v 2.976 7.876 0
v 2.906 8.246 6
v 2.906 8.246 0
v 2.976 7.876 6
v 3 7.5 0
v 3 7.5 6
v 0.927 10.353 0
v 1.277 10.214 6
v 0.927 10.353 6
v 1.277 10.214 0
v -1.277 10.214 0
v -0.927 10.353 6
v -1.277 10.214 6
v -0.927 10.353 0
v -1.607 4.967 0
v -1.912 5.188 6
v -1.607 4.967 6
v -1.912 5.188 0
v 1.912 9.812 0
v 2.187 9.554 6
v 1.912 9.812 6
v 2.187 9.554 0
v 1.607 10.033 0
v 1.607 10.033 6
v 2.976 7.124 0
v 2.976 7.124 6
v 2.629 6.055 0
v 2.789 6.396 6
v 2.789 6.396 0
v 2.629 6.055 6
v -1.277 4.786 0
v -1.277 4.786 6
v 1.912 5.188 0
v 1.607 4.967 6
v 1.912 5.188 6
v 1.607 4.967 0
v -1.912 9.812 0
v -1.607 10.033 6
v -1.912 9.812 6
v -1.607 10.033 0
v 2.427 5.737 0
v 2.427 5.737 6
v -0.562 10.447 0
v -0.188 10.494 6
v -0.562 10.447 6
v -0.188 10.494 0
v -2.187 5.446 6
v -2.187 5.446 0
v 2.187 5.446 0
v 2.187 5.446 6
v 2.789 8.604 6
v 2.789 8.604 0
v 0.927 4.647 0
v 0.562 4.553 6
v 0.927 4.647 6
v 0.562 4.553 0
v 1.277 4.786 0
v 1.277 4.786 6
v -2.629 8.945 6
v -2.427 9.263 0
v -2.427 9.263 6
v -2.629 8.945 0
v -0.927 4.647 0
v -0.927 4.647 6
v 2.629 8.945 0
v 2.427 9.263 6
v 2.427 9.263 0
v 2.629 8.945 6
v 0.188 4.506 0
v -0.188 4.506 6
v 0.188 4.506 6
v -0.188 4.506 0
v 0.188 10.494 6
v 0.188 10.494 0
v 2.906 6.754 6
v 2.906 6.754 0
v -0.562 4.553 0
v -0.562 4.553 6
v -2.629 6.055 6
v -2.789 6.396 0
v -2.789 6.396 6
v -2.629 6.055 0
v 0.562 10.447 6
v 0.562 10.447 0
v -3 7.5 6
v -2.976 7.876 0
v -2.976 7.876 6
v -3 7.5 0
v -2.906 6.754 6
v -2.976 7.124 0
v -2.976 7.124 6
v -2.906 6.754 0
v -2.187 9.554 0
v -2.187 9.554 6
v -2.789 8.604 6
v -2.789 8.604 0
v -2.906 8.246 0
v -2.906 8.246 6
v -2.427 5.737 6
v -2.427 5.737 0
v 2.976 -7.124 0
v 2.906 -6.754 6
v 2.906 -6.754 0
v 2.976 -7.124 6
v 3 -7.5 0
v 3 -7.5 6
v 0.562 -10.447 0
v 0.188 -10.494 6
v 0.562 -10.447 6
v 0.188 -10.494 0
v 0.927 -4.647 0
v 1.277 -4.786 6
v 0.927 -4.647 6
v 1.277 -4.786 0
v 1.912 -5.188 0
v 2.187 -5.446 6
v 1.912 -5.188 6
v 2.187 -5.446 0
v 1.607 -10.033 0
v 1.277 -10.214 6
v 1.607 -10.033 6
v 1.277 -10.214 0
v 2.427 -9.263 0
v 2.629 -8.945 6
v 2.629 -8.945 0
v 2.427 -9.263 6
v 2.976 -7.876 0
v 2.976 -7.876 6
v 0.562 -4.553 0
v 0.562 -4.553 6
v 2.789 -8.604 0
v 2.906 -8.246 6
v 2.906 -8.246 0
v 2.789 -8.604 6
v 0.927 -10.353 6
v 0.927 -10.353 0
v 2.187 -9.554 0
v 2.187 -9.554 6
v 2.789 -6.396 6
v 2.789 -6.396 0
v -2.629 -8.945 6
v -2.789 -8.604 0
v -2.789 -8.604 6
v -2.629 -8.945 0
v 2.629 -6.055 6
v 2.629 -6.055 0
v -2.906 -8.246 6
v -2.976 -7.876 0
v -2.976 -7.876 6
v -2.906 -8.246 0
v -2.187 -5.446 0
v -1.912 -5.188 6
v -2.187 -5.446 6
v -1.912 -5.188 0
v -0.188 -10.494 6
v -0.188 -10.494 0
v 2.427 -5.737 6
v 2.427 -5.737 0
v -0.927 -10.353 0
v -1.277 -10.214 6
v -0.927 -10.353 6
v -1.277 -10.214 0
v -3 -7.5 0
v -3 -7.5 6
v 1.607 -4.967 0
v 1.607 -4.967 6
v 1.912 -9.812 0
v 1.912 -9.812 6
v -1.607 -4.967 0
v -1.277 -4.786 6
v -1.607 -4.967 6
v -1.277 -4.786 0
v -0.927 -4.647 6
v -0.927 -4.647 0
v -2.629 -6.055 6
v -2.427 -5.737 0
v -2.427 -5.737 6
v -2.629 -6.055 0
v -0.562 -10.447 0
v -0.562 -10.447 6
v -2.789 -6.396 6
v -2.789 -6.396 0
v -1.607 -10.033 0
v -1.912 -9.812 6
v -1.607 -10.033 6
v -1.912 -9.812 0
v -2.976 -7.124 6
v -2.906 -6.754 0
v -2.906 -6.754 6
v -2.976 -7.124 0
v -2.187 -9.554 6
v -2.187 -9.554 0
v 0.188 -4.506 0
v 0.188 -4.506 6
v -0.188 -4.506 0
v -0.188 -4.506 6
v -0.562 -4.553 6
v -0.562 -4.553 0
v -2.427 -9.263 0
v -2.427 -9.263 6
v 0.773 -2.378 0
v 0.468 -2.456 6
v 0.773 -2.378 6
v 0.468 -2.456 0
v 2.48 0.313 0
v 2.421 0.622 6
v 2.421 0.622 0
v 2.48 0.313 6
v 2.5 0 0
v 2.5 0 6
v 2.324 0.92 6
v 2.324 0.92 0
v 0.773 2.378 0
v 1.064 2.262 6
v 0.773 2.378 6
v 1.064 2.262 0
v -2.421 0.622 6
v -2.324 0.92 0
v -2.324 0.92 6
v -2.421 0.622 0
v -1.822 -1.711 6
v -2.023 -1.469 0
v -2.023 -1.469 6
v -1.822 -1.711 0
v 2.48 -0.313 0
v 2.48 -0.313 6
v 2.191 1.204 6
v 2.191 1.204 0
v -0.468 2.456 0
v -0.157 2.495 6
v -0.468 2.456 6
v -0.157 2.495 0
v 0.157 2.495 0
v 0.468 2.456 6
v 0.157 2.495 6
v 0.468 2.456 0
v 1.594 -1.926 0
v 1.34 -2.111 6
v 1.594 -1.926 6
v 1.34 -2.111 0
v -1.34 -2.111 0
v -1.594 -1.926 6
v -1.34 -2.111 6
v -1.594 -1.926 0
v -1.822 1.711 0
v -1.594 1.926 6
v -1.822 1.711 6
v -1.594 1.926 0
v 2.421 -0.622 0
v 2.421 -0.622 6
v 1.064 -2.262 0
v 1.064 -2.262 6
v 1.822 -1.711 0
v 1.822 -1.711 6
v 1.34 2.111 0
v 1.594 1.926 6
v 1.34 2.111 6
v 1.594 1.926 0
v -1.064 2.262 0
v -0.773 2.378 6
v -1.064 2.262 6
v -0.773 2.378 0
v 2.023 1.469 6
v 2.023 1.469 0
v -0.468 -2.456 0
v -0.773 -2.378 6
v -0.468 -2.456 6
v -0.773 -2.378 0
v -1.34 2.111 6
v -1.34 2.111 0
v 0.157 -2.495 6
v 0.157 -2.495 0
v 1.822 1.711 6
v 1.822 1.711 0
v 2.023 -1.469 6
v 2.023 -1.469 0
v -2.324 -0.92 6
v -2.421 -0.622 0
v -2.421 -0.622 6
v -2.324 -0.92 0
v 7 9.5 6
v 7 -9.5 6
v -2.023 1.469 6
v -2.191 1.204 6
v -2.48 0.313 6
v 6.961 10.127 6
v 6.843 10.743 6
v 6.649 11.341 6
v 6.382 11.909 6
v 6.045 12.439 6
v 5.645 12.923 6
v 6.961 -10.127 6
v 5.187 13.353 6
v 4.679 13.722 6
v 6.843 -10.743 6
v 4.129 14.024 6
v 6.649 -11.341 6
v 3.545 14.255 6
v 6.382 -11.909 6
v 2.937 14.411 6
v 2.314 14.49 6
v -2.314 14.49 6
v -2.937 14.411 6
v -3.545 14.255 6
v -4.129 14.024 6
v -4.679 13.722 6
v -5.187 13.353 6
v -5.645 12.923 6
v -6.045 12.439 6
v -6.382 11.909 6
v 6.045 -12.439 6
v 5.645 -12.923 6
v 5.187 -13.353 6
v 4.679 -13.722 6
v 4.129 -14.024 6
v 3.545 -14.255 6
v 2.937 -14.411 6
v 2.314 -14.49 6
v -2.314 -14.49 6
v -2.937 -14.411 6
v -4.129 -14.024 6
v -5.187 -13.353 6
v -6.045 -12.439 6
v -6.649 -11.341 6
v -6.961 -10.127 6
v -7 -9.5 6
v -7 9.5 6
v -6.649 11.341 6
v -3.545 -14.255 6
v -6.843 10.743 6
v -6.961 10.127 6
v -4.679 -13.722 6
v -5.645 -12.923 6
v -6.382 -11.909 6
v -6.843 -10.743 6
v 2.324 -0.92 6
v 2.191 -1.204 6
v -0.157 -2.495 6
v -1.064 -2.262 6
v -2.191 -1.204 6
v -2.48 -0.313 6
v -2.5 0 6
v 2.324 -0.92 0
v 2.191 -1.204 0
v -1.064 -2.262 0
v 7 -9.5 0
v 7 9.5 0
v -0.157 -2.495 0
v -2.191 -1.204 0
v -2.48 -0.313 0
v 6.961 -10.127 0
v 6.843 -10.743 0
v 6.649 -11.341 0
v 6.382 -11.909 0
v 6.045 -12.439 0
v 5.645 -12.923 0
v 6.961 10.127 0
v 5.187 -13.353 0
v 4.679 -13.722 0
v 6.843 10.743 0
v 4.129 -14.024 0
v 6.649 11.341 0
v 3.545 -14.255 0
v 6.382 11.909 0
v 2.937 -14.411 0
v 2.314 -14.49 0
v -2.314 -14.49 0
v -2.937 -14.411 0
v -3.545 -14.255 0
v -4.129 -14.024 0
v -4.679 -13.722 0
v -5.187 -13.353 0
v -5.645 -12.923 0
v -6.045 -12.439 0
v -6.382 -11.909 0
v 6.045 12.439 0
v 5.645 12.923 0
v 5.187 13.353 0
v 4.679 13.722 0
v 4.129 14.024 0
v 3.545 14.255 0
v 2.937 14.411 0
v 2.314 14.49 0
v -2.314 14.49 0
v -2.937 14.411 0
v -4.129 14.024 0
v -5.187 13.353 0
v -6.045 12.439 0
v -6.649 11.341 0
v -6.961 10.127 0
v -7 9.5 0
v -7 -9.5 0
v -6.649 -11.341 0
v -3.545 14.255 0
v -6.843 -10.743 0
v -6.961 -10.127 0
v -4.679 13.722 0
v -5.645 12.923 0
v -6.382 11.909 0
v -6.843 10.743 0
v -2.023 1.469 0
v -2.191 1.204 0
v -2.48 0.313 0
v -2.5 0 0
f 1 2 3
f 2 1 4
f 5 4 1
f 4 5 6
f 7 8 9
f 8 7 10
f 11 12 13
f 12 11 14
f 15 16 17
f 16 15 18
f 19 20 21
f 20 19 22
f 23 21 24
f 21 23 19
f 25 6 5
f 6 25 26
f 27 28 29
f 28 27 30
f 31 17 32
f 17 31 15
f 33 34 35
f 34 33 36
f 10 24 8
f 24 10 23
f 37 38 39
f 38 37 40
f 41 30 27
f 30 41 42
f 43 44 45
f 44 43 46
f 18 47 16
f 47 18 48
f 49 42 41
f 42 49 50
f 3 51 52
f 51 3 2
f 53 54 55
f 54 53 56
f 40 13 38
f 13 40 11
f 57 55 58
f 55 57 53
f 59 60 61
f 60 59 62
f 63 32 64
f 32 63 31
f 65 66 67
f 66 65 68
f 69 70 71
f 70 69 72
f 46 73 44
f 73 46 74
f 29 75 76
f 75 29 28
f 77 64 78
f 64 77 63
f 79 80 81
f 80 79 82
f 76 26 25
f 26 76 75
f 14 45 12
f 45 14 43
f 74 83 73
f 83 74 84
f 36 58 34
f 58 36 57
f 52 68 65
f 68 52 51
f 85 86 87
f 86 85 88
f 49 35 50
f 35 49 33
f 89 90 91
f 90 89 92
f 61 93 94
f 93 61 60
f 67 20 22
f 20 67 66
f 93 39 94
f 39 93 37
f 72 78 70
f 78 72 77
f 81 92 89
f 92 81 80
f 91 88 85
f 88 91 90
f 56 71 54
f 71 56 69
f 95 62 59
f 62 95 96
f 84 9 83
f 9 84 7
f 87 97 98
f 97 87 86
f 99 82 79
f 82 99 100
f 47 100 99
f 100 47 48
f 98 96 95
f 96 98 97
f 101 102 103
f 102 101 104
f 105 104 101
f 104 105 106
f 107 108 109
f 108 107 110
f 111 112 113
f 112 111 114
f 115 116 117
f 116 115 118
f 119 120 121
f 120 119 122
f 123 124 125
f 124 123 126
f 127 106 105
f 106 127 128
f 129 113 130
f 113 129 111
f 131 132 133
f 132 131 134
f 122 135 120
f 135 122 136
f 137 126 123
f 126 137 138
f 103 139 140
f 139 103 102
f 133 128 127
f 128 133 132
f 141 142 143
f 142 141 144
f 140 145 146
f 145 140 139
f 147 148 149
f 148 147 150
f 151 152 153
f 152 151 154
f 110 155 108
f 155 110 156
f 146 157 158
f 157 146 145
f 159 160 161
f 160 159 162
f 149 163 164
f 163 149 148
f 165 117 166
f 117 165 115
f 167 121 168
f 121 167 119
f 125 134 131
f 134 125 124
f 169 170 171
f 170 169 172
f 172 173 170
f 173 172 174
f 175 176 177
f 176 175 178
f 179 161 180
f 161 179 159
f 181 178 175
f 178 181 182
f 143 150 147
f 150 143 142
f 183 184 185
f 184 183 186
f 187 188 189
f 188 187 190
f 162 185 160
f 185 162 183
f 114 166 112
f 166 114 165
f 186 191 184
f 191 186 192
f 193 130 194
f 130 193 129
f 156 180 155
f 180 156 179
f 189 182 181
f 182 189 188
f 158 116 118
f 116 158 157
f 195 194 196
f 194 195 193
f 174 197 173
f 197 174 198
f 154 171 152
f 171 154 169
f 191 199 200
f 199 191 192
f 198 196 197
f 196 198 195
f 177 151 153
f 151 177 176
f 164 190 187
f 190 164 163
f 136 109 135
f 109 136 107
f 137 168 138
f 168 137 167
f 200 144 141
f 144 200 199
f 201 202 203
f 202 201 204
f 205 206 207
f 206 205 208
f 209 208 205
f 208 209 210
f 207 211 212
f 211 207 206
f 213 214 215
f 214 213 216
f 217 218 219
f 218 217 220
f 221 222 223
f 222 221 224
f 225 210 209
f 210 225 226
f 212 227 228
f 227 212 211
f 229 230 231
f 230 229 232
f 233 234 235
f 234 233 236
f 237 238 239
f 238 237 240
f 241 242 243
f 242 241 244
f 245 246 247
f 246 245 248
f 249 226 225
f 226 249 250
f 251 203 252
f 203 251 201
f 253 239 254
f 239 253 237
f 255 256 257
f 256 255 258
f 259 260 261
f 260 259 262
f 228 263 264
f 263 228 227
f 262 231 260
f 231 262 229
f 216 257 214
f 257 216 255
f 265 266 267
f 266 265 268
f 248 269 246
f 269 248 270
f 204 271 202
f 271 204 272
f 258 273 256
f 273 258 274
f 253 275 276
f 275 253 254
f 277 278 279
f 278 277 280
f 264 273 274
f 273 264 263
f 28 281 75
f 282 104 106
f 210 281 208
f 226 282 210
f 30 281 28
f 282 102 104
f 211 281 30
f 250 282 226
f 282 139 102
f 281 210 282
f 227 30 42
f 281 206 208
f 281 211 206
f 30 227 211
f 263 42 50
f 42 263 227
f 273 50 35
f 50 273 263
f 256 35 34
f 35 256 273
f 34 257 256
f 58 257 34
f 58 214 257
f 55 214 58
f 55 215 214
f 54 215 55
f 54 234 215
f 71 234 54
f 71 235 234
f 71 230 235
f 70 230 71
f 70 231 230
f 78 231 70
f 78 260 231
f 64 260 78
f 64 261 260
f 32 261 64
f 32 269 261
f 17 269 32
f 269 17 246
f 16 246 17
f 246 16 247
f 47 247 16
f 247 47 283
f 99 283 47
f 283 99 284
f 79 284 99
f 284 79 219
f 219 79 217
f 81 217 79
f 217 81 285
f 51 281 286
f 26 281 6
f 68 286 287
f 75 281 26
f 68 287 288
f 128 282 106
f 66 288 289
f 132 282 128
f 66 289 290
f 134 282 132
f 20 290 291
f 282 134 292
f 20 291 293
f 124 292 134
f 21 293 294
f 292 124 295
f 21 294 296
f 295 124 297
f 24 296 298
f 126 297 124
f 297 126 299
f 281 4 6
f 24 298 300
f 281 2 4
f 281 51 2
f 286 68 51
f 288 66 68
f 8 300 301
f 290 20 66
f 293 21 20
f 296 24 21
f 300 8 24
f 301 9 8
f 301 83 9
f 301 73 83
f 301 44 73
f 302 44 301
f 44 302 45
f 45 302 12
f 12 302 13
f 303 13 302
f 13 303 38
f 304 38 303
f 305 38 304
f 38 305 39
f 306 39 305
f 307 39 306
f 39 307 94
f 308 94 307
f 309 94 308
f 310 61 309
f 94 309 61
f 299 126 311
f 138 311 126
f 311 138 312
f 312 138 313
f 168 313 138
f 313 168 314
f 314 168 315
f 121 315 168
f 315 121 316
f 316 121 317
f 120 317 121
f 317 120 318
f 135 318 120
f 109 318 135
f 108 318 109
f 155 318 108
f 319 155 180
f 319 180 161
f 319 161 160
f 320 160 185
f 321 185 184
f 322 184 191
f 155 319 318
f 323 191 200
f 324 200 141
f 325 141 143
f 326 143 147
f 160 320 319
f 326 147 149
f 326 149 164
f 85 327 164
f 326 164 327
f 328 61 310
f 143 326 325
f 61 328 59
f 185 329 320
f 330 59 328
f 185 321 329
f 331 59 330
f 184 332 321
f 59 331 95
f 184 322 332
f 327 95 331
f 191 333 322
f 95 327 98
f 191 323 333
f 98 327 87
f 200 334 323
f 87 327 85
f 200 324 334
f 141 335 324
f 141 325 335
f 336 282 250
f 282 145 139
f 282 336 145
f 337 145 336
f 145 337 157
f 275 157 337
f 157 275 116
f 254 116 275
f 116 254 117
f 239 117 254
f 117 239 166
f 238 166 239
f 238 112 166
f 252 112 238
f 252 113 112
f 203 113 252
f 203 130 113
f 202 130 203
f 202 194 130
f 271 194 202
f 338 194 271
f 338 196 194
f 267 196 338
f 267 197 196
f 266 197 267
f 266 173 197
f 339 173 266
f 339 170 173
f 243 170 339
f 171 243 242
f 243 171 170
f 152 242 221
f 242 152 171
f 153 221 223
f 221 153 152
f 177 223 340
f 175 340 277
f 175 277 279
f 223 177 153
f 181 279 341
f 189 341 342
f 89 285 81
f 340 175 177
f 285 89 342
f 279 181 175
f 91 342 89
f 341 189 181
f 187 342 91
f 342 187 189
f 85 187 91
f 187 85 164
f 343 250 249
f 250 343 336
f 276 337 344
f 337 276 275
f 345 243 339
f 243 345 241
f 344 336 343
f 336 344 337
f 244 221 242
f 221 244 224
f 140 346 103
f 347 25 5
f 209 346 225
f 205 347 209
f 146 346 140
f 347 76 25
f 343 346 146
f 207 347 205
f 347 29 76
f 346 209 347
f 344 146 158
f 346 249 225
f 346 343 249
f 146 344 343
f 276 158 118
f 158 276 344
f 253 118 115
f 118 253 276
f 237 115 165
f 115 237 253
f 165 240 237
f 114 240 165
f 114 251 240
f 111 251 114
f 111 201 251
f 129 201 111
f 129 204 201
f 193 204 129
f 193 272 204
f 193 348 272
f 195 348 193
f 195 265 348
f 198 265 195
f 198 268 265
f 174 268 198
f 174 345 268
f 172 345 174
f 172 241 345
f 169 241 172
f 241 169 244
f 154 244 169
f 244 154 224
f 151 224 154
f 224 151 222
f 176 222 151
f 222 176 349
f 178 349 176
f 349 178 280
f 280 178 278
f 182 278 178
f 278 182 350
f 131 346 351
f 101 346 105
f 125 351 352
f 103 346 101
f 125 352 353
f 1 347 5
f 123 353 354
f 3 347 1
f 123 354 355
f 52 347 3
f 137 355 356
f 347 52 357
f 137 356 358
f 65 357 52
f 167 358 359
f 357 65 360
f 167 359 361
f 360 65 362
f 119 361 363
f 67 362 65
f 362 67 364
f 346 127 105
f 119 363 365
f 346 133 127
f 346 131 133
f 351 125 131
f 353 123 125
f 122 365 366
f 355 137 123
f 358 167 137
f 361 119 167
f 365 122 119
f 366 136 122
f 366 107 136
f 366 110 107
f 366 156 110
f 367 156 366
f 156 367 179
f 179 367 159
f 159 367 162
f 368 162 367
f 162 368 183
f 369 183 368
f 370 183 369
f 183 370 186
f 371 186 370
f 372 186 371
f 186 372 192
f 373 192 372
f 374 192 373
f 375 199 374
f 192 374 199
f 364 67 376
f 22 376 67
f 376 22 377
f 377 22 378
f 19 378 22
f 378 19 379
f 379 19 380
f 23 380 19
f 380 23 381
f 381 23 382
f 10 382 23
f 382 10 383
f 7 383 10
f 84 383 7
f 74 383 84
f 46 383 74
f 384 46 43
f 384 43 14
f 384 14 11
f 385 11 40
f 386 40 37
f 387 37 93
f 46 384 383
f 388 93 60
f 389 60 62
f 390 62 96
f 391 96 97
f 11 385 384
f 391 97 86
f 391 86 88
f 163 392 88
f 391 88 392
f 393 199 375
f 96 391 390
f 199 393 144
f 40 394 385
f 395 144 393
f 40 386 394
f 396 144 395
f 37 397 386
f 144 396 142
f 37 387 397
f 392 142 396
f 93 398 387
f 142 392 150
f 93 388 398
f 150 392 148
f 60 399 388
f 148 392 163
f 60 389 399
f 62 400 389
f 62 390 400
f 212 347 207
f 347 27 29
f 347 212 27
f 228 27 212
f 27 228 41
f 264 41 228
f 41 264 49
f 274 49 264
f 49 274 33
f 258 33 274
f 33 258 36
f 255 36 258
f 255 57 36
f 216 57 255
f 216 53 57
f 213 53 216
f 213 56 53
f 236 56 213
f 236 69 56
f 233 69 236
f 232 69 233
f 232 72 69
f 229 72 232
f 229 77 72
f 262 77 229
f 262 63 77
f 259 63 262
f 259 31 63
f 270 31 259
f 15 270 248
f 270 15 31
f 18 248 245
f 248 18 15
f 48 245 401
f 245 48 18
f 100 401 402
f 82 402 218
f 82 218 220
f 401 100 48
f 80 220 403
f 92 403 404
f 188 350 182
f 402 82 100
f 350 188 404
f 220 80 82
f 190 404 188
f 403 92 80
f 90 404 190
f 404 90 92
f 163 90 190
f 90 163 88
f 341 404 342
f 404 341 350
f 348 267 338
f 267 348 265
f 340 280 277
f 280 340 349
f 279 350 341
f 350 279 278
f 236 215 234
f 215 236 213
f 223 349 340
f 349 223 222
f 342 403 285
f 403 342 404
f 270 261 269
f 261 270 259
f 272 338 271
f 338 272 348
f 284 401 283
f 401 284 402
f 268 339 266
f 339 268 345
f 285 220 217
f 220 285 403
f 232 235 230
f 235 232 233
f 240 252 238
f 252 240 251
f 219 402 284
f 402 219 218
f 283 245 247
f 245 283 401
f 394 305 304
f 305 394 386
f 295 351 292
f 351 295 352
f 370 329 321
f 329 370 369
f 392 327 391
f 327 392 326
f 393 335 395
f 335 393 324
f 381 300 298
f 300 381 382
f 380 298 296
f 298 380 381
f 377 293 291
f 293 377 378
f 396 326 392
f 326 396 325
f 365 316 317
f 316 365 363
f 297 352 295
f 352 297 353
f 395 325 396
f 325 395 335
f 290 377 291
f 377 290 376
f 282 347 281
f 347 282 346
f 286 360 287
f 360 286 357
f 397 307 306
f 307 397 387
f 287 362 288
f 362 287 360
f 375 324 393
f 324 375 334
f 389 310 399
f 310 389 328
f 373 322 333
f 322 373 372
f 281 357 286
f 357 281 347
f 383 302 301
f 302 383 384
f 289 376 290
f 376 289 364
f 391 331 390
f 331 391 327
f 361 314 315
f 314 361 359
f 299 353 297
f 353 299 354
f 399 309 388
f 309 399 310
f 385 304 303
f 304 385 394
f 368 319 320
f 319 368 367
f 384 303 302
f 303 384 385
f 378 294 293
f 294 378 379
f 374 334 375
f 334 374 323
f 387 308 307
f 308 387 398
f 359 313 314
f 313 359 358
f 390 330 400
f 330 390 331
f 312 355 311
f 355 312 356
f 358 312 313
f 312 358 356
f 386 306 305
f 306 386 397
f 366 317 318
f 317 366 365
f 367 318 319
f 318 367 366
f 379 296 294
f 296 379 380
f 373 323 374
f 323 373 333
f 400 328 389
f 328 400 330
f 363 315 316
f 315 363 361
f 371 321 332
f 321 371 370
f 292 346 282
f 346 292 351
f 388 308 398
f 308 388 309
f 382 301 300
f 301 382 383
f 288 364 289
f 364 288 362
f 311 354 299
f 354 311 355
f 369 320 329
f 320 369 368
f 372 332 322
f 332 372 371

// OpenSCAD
$fn = 50;


difference() {
	union() {
		hull() {
			translate(v = [-2.0000000000, 9.5000000000, 0]) {
				cylinder(h = 6, r = 5);
			}
			translate(v = [2.0000000000, 9.5000000000, 0]) {
				cylinder(h = 6, r = 5);
			}
			translate(v = [-2.0000000000, -9.5000000000, 0]) {
				cylinder(h = 6, r = 5);
			}
			translate(v = [2.0000000000, -9.5000000000, 0]) {
				cylinder(h = 6, r = 5);
			}
		}
	}
	union() {
		#translate(v = [0.0000000000, 7.5000000000, 0]) {
			cylinder(h = 6, r = 3.0000000000);
		}
		#translate(v = [0.0000000000, -7.5000000000, 0]) {
			cylinder(h = 6, r = 3.0000000000);
		}
		#translate(v = [0.0000000000, -7.5000000000, -100.0000000000]) {
			cylinder(h = 200, r = 3.0000000000);
		}
		#translate(v = [0.0000000000, -7.5000000000, -100.0000000000]) {
			cylinder(h = 200, r = 3.0000000000);
		}
		#translate(v = [0.0000000000, 7.5000000000, -100.0000000000]) {
			cylinder(h = 200, r = 3.0000000000);
		}
		#translate(v = [0.0000000000, 7.5000000000, -100.0000000000]) {
			cylinder(h = 200, r = 3.0000000000);
		}
		#translate(v = [0.0000000000, 7.5000000000, 0]) {
			cylinder(h = 6, r = 1.5000000000);
		}
		#translate(v = [0.0000000000, -7.5000000000, 0]) {
			cylinder(h = 6, r = 1.5000000000);
		}
		#translate(v = [0.0000000000, 7.5000000000, 0]) {
			cylinder(h = 6, r = 1.5000000000);
		}
		#translate(v = [0.0000000000, -7.5000000000, 0]) {
			cylinder(h = 6, r = 1.5000000000);
		}
		#translate(v = [0.0000000000, 7.5000000000, 0]) {
			cylinder(h = 6, r = 1.5000000000);
		}
		#translate(v = [0.0000000000, -7.5000000000, 0]) {
			cylinder(h = 6, r = 1.5000000000);
		}
		#cylinder(h = 6, r = 2.5000000000);
	}
}
